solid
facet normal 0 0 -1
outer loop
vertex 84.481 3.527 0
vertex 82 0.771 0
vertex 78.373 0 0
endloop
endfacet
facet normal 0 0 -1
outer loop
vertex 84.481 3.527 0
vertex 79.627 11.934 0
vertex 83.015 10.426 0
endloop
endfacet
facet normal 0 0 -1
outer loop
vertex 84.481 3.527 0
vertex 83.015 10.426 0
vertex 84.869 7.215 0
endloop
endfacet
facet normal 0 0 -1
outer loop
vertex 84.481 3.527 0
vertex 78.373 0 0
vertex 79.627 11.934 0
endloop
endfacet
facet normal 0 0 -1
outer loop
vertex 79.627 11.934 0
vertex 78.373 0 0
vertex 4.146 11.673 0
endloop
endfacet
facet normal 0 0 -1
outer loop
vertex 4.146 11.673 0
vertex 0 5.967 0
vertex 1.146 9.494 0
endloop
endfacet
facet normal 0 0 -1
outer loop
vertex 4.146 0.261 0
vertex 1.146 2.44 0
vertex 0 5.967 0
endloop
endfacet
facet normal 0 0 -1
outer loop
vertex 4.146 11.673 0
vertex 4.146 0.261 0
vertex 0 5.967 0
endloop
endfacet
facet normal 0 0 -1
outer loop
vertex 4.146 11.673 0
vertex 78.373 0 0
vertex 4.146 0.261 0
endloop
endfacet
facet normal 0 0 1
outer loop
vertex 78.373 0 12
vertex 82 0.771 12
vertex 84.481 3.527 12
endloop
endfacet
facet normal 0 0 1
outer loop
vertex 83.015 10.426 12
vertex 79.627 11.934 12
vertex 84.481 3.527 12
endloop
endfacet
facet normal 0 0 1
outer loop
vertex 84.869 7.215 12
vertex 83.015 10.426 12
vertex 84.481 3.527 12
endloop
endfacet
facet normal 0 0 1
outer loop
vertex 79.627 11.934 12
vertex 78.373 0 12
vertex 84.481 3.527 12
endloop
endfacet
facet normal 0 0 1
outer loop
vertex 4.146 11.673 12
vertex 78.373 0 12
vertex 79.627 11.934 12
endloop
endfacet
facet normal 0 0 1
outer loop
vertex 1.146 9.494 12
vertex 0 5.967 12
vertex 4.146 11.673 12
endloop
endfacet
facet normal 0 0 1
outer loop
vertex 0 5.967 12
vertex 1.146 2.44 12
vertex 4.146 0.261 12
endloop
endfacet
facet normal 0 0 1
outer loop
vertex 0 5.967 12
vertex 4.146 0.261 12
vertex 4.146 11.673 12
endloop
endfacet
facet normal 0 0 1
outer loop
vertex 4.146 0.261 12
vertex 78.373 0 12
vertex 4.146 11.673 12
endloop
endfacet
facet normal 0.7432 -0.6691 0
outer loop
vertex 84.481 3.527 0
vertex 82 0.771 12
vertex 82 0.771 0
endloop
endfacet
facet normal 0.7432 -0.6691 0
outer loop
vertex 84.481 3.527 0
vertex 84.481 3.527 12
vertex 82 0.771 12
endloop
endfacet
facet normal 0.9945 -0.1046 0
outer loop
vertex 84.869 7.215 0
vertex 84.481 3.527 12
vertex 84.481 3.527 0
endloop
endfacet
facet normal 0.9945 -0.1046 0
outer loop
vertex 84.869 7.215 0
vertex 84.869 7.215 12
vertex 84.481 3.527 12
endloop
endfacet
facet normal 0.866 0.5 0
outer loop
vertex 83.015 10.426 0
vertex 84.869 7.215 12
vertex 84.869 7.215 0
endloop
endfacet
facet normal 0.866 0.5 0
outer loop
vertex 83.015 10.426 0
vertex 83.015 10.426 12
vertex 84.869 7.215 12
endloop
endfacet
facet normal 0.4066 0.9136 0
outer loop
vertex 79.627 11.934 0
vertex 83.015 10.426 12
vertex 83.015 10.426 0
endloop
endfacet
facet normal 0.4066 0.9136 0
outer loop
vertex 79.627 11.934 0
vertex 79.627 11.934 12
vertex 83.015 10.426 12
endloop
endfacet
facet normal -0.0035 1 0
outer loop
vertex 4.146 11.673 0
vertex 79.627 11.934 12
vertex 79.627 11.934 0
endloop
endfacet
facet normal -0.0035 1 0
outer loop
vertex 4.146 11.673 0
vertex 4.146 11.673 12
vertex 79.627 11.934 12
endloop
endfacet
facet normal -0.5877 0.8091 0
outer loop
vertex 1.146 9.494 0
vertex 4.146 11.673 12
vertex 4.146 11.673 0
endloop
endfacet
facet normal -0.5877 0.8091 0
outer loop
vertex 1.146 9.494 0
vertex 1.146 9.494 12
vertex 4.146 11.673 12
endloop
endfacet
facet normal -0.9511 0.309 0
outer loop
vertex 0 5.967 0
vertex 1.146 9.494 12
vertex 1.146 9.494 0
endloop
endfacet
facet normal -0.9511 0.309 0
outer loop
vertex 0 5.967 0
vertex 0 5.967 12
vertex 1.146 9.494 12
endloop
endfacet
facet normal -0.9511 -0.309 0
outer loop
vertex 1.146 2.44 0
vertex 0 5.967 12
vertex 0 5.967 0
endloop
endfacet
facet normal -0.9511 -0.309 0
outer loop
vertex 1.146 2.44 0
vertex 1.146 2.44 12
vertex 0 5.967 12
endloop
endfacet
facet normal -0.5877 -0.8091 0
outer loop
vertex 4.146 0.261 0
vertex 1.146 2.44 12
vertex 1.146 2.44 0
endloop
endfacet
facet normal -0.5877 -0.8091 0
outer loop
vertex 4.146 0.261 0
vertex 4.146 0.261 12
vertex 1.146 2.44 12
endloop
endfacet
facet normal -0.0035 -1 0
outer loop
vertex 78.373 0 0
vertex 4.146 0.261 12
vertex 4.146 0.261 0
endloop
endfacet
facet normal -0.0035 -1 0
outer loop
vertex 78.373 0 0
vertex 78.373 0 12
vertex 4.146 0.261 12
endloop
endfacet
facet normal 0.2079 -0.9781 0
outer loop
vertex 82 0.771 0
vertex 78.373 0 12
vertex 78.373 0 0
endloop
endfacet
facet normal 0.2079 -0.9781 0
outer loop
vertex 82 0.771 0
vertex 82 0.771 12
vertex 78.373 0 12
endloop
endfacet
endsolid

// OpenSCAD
$fn = 32;

// ----------------------------------------------------------------------
// Key bar: parallel key, 12 mm thick
// ----------------------------------------------------------------------

// --- parameters (mm) ---
profile_height = 12;      // extrusion height
profile_points = 11;      // points of the closed outline

profile = [[0, 5.967], [1.146, 2.44], [4.146, 0.261], [78.373, 0], [82, 0.771], [84.481, 3.527], [84.869, 7.215], [83.015, 10.426], [79.627, 11.934], [4.146, 11.673], [1.146, 9.494]];  // single closed polygon, 11 points, counter clockwise

// --- the one profile operation ---
linear_extrude(height = profile_height) polygon(points = profile);
